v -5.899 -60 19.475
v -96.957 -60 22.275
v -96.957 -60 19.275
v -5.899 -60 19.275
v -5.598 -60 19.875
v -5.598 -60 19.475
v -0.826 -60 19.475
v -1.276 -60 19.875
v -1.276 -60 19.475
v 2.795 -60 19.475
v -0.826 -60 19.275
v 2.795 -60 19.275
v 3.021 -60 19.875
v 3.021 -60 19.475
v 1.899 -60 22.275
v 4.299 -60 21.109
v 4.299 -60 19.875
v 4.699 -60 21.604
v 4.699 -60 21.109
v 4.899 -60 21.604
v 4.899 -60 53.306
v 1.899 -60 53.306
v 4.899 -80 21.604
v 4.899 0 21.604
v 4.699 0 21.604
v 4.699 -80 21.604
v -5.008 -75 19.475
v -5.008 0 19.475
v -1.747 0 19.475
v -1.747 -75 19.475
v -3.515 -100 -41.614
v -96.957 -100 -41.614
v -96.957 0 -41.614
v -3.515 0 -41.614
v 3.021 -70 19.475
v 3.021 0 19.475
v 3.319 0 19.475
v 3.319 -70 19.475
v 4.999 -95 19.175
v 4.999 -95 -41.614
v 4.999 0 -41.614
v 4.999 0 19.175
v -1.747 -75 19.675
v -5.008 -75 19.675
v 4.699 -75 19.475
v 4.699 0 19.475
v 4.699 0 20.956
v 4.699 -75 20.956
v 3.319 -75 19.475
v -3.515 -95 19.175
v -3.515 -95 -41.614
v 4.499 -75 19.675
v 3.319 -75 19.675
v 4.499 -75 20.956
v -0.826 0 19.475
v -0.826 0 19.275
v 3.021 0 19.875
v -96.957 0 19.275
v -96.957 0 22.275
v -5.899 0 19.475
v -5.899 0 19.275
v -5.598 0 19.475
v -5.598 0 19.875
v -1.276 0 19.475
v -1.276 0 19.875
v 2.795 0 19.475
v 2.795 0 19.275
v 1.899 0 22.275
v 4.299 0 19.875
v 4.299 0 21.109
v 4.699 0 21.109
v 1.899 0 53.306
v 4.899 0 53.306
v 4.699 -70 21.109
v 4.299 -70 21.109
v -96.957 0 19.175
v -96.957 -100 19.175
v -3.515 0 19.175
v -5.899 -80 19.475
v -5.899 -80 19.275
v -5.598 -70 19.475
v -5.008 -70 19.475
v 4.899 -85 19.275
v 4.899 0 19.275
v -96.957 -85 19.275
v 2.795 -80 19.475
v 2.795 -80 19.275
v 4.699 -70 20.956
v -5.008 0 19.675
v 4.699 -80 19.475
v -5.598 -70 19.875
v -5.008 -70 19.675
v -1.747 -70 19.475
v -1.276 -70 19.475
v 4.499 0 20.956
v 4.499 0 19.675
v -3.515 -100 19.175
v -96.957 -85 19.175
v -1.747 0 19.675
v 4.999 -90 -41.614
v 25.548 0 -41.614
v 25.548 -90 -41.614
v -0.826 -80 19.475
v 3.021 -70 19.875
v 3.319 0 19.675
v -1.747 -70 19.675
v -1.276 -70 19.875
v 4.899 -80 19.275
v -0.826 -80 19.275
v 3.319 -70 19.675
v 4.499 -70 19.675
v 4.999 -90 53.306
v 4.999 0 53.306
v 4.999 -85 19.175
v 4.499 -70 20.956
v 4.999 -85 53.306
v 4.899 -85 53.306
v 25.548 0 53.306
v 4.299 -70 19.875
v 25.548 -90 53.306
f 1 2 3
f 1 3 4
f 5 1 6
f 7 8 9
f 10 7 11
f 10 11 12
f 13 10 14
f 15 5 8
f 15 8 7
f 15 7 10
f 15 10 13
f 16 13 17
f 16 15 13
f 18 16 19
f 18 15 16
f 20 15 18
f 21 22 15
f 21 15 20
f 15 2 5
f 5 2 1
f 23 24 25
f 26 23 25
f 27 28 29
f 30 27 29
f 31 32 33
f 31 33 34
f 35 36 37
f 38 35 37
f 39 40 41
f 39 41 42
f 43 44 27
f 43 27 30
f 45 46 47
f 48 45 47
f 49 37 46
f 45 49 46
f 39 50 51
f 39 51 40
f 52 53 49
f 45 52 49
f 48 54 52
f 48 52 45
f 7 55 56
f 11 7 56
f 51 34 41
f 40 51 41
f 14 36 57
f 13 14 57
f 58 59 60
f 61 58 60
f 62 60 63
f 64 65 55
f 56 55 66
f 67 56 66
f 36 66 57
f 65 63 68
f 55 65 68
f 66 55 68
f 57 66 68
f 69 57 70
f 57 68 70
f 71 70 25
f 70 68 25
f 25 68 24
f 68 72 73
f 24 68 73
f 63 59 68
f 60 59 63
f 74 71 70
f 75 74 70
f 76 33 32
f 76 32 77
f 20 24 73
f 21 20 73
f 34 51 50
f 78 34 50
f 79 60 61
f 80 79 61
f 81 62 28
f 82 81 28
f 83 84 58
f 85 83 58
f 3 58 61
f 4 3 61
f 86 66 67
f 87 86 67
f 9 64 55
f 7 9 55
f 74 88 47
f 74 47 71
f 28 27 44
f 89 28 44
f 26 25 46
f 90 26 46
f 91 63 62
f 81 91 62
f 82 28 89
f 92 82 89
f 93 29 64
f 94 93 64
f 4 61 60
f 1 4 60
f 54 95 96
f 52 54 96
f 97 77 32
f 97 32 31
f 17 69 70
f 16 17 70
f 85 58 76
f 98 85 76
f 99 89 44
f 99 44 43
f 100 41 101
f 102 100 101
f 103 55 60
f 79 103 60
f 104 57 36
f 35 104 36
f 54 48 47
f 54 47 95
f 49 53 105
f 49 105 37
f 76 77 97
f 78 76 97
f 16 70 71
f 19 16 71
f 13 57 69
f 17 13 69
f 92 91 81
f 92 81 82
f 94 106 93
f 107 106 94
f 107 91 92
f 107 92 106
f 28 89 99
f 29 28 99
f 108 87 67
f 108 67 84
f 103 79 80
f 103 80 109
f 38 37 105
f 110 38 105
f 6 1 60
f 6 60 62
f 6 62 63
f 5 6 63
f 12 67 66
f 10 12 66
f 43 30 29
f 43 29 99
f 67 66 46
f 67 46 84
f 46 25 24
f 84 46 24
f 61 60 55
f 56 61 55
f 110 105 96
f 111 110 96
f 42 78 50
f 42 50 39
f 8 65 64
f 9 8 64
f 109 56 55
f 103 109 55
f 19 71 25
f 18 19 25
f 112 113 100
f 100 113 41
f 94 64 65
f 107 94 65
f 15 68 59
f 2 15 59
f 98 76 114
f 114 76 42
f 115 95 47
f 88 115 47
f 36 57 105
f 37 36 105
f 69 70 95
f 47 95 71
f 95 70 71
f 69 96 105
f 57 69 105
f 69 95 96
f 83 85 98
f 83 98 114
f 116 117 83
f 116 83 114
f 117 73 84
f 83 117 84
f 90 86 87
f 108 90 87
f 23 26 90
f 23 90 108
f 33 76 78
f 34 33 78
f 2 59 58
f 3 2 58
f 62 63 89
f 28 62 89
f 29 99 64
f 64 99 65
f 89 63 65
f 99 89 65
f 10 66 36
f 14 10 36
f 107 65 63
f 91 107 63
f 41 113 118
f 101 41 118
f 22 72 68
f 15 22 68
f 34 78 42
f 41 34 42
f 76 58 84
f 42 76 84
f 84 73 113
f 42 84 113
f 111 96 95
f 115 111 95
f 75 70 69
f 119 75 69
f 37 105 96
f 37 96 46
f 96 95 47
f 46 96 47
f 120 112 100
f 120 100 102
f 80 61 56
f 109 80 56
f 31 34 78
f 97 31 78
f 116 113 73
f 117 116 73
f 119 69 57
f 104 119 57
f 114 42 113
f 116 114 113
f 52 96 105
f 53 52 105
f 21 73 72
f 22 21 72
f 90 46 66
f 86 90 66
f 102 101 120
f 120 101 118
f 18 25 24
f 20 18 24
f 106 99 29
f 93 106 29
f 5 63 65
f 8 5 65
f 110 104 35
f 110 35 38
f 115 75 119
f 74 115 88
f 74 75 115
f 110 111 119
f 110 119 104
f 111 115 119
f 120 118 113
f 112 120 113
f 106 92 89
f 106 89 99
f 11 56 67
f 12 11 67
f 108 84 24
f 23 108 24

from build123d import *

# Parameters (mm, degrees)
F0_W      = 93.441633
F0_H      = 60.788692
F1_DEPTH  = 100
F0_W_2    = 8.514363
F2_DEPTH  = 95
F3_DEPTH  = 90
F4_DEPTH  = 85
F5_DEPTH  = 80
F6_DEPTH  = 80
F0_W_3    = 3.261623
F0_H_2    = 0.2
F7_DEPTH  = 75
F8_DEPTH  = 75
F9_DEPTH  = 70
F10_DEPTH = 70
F11_DEPTH = 60


with BuildPart() as f1:
    # F0 (on Front) → F1 (new body)
    with BuildSketch(Plane.XZ):
        with Locations((-50.23581, -11.219251)):
            Rectangle(F0_W, F0_H)
    extrude(amount=F1_DEPTH)


with BuildPart() as f2:
    # F0 (on Front) → F2 (new body)
    with BuildSketch(Plane.XZ):
        with Locations((0.742188, -11.219251)):
            Rectangle(F0_W_2, F0_H)
    extrude(amount=F2_DEPTH)


with BuildPart() as f3:
    # F0 (on Front) → F3 (new body)
    with BuildSketch(Plane.XZ):
        Polygon((4.99937, 53.305682), (4.99937, 19.175095), (4.99937, -41.613597), (25.547567, -41.613597), (25.547567, 53.305682), align=None)
    extrude(amount=F3_DEPTH)


with BuildPart() as f4:
    # F0 (on Front) → F4 (new body)
    with BuildSketch(Plane.XZ):
        Polygon((-96.956626, 19.275095), (-96.956626, 19.175095), (-3.514993, 19.175095), (4.99937, 19.175095), (4.99937, 53.305682), (4.89937, 53.305682), (4.89937, 21.603736), (4.89937, 19.275095), (2.794611, 19.275095), (-0.826114, 19.275095), (-5.898638, 19.275095), align=None)
    extrude(amount=F4_DEPTH)


with BuildPart() as f5:
    # F0 (on Front) → F5 (new body)
    with BuildSketch(Plane.XZ):
        Polygon((-5.898638, 19.475095), (-5.898638, 19.275095), (-0.826114, 19.275095), (-0.826114, 19.475095), (-1.276339, 19.475095), (-1.746572, 19.475095), (-5.008195, 19.475095), (-5.598489, 19.475095), align=None)
    extrude(amount=F5_DEPTH)


with BuildPart() as f6:
    # F0 (on Front) → F6 (new body)
    with BuildSketch(Plane.XZ):
        Polygon((2.794611, 19.475095), (2.794611, 19.275095), (4.89937, 19.275095), (4.89937, 21.603736), (4.69937, 21.603736), (4.69937, 21.109089), (4.69937, 20.955889), (4.69937, 19.475095), (3.319059, 19.475095), (3.020844, 19.475095), align=None)
    extrude(amount=F6_DEPTH)


with BuildPart() as f7:
    # F0 (on Front) → F7 (new body)
    with BuildSketch(Plane.XZ):
        with Locations((-3.377383, 19.575095)):
            Rectangle(F0_W_3, F0_H_2)
    extrude(amount=F7_DEPTH)


with BuildPart() as f8:
    # F0 (on Front) → F8 (new body)
    with BuildSketch(Plane.XZ):
        Polygon((3.319059, 19.675095), (3.319059, 19.475095), (4.69937, 19.475095), (4.69937, 20.955889), (4.49937, 20.955889), (4.49937, 19.675095), align=None)
    extrude(amount=F8_DEPTH)


with BuildPart() as f9:
    # F0 (on Front) → F9 (new body)
    with BuildSketch(Plane.XZ):
        Polygon((-5.598489, 19.875095), (-5.598489, 19.475095), (-5.008195, 19.475095), (-5.008195, 19.675095), (-1.746572, 19.675095), (-1.746572, 19.475095), (-1.276339, 19.475095), (-1.276339, 19.875095), align=None)
    extrude(amount=F9_DEPTH)


with BuildPart() as f10:
    # F0 (on Front) → F10 (new body)
    with BuildSketch(Plane.XZ):
        Polygon((3.020844, 19.875095), (3.020844, 19.475095), (3.319059, 19.475095), (3.319059, 19.675095), (4.49937, 19.675095), (4.49937, 20.955889), (4.69937, 20.955889), (4.69937, 21.109089), (4.29937, 21.109089), (4.29937, 19.875095), align=None)
    extrude(amount=F10_DEPTH)


with BuildPart() as f11:
    # F0 (on Front) → F11 (new body)
    with BuildSketch(Plane.XZ):
        Polygon((-96.956626, 22.275095), (-96.956626, 19.275095), (-5.898638, 19.275095), (-5.898638, 19.475095), (-5.598489, 19.475095), (-5.598489, 19.875095), (-1.276339, 19.875095), (-1.276339, 19.475095), (-0.826114, 19.475095), (-0.826114, 19.275095), (2.794611, 19.275095), (2.794611, 19.475095), (3.020844, 19.475095), (3.020844, 19.875095), (4.29937, 19.875095), (4.29937, 21.109089), (4.69937, 21.109089), (4.69937, 21.603736), (4.89937, 21.603736), (4.89937, 53.305682), (1.89937, 53.305682), (1.89937, 22.275095), align=None)
    extrude(amount=F11_DEPTH)


solid = Compound([f1.part, f2.part, f3.part, f4.part, f5.part, f6.part, f7.part, f8.part, f9.part, f10.part, f11.part])
